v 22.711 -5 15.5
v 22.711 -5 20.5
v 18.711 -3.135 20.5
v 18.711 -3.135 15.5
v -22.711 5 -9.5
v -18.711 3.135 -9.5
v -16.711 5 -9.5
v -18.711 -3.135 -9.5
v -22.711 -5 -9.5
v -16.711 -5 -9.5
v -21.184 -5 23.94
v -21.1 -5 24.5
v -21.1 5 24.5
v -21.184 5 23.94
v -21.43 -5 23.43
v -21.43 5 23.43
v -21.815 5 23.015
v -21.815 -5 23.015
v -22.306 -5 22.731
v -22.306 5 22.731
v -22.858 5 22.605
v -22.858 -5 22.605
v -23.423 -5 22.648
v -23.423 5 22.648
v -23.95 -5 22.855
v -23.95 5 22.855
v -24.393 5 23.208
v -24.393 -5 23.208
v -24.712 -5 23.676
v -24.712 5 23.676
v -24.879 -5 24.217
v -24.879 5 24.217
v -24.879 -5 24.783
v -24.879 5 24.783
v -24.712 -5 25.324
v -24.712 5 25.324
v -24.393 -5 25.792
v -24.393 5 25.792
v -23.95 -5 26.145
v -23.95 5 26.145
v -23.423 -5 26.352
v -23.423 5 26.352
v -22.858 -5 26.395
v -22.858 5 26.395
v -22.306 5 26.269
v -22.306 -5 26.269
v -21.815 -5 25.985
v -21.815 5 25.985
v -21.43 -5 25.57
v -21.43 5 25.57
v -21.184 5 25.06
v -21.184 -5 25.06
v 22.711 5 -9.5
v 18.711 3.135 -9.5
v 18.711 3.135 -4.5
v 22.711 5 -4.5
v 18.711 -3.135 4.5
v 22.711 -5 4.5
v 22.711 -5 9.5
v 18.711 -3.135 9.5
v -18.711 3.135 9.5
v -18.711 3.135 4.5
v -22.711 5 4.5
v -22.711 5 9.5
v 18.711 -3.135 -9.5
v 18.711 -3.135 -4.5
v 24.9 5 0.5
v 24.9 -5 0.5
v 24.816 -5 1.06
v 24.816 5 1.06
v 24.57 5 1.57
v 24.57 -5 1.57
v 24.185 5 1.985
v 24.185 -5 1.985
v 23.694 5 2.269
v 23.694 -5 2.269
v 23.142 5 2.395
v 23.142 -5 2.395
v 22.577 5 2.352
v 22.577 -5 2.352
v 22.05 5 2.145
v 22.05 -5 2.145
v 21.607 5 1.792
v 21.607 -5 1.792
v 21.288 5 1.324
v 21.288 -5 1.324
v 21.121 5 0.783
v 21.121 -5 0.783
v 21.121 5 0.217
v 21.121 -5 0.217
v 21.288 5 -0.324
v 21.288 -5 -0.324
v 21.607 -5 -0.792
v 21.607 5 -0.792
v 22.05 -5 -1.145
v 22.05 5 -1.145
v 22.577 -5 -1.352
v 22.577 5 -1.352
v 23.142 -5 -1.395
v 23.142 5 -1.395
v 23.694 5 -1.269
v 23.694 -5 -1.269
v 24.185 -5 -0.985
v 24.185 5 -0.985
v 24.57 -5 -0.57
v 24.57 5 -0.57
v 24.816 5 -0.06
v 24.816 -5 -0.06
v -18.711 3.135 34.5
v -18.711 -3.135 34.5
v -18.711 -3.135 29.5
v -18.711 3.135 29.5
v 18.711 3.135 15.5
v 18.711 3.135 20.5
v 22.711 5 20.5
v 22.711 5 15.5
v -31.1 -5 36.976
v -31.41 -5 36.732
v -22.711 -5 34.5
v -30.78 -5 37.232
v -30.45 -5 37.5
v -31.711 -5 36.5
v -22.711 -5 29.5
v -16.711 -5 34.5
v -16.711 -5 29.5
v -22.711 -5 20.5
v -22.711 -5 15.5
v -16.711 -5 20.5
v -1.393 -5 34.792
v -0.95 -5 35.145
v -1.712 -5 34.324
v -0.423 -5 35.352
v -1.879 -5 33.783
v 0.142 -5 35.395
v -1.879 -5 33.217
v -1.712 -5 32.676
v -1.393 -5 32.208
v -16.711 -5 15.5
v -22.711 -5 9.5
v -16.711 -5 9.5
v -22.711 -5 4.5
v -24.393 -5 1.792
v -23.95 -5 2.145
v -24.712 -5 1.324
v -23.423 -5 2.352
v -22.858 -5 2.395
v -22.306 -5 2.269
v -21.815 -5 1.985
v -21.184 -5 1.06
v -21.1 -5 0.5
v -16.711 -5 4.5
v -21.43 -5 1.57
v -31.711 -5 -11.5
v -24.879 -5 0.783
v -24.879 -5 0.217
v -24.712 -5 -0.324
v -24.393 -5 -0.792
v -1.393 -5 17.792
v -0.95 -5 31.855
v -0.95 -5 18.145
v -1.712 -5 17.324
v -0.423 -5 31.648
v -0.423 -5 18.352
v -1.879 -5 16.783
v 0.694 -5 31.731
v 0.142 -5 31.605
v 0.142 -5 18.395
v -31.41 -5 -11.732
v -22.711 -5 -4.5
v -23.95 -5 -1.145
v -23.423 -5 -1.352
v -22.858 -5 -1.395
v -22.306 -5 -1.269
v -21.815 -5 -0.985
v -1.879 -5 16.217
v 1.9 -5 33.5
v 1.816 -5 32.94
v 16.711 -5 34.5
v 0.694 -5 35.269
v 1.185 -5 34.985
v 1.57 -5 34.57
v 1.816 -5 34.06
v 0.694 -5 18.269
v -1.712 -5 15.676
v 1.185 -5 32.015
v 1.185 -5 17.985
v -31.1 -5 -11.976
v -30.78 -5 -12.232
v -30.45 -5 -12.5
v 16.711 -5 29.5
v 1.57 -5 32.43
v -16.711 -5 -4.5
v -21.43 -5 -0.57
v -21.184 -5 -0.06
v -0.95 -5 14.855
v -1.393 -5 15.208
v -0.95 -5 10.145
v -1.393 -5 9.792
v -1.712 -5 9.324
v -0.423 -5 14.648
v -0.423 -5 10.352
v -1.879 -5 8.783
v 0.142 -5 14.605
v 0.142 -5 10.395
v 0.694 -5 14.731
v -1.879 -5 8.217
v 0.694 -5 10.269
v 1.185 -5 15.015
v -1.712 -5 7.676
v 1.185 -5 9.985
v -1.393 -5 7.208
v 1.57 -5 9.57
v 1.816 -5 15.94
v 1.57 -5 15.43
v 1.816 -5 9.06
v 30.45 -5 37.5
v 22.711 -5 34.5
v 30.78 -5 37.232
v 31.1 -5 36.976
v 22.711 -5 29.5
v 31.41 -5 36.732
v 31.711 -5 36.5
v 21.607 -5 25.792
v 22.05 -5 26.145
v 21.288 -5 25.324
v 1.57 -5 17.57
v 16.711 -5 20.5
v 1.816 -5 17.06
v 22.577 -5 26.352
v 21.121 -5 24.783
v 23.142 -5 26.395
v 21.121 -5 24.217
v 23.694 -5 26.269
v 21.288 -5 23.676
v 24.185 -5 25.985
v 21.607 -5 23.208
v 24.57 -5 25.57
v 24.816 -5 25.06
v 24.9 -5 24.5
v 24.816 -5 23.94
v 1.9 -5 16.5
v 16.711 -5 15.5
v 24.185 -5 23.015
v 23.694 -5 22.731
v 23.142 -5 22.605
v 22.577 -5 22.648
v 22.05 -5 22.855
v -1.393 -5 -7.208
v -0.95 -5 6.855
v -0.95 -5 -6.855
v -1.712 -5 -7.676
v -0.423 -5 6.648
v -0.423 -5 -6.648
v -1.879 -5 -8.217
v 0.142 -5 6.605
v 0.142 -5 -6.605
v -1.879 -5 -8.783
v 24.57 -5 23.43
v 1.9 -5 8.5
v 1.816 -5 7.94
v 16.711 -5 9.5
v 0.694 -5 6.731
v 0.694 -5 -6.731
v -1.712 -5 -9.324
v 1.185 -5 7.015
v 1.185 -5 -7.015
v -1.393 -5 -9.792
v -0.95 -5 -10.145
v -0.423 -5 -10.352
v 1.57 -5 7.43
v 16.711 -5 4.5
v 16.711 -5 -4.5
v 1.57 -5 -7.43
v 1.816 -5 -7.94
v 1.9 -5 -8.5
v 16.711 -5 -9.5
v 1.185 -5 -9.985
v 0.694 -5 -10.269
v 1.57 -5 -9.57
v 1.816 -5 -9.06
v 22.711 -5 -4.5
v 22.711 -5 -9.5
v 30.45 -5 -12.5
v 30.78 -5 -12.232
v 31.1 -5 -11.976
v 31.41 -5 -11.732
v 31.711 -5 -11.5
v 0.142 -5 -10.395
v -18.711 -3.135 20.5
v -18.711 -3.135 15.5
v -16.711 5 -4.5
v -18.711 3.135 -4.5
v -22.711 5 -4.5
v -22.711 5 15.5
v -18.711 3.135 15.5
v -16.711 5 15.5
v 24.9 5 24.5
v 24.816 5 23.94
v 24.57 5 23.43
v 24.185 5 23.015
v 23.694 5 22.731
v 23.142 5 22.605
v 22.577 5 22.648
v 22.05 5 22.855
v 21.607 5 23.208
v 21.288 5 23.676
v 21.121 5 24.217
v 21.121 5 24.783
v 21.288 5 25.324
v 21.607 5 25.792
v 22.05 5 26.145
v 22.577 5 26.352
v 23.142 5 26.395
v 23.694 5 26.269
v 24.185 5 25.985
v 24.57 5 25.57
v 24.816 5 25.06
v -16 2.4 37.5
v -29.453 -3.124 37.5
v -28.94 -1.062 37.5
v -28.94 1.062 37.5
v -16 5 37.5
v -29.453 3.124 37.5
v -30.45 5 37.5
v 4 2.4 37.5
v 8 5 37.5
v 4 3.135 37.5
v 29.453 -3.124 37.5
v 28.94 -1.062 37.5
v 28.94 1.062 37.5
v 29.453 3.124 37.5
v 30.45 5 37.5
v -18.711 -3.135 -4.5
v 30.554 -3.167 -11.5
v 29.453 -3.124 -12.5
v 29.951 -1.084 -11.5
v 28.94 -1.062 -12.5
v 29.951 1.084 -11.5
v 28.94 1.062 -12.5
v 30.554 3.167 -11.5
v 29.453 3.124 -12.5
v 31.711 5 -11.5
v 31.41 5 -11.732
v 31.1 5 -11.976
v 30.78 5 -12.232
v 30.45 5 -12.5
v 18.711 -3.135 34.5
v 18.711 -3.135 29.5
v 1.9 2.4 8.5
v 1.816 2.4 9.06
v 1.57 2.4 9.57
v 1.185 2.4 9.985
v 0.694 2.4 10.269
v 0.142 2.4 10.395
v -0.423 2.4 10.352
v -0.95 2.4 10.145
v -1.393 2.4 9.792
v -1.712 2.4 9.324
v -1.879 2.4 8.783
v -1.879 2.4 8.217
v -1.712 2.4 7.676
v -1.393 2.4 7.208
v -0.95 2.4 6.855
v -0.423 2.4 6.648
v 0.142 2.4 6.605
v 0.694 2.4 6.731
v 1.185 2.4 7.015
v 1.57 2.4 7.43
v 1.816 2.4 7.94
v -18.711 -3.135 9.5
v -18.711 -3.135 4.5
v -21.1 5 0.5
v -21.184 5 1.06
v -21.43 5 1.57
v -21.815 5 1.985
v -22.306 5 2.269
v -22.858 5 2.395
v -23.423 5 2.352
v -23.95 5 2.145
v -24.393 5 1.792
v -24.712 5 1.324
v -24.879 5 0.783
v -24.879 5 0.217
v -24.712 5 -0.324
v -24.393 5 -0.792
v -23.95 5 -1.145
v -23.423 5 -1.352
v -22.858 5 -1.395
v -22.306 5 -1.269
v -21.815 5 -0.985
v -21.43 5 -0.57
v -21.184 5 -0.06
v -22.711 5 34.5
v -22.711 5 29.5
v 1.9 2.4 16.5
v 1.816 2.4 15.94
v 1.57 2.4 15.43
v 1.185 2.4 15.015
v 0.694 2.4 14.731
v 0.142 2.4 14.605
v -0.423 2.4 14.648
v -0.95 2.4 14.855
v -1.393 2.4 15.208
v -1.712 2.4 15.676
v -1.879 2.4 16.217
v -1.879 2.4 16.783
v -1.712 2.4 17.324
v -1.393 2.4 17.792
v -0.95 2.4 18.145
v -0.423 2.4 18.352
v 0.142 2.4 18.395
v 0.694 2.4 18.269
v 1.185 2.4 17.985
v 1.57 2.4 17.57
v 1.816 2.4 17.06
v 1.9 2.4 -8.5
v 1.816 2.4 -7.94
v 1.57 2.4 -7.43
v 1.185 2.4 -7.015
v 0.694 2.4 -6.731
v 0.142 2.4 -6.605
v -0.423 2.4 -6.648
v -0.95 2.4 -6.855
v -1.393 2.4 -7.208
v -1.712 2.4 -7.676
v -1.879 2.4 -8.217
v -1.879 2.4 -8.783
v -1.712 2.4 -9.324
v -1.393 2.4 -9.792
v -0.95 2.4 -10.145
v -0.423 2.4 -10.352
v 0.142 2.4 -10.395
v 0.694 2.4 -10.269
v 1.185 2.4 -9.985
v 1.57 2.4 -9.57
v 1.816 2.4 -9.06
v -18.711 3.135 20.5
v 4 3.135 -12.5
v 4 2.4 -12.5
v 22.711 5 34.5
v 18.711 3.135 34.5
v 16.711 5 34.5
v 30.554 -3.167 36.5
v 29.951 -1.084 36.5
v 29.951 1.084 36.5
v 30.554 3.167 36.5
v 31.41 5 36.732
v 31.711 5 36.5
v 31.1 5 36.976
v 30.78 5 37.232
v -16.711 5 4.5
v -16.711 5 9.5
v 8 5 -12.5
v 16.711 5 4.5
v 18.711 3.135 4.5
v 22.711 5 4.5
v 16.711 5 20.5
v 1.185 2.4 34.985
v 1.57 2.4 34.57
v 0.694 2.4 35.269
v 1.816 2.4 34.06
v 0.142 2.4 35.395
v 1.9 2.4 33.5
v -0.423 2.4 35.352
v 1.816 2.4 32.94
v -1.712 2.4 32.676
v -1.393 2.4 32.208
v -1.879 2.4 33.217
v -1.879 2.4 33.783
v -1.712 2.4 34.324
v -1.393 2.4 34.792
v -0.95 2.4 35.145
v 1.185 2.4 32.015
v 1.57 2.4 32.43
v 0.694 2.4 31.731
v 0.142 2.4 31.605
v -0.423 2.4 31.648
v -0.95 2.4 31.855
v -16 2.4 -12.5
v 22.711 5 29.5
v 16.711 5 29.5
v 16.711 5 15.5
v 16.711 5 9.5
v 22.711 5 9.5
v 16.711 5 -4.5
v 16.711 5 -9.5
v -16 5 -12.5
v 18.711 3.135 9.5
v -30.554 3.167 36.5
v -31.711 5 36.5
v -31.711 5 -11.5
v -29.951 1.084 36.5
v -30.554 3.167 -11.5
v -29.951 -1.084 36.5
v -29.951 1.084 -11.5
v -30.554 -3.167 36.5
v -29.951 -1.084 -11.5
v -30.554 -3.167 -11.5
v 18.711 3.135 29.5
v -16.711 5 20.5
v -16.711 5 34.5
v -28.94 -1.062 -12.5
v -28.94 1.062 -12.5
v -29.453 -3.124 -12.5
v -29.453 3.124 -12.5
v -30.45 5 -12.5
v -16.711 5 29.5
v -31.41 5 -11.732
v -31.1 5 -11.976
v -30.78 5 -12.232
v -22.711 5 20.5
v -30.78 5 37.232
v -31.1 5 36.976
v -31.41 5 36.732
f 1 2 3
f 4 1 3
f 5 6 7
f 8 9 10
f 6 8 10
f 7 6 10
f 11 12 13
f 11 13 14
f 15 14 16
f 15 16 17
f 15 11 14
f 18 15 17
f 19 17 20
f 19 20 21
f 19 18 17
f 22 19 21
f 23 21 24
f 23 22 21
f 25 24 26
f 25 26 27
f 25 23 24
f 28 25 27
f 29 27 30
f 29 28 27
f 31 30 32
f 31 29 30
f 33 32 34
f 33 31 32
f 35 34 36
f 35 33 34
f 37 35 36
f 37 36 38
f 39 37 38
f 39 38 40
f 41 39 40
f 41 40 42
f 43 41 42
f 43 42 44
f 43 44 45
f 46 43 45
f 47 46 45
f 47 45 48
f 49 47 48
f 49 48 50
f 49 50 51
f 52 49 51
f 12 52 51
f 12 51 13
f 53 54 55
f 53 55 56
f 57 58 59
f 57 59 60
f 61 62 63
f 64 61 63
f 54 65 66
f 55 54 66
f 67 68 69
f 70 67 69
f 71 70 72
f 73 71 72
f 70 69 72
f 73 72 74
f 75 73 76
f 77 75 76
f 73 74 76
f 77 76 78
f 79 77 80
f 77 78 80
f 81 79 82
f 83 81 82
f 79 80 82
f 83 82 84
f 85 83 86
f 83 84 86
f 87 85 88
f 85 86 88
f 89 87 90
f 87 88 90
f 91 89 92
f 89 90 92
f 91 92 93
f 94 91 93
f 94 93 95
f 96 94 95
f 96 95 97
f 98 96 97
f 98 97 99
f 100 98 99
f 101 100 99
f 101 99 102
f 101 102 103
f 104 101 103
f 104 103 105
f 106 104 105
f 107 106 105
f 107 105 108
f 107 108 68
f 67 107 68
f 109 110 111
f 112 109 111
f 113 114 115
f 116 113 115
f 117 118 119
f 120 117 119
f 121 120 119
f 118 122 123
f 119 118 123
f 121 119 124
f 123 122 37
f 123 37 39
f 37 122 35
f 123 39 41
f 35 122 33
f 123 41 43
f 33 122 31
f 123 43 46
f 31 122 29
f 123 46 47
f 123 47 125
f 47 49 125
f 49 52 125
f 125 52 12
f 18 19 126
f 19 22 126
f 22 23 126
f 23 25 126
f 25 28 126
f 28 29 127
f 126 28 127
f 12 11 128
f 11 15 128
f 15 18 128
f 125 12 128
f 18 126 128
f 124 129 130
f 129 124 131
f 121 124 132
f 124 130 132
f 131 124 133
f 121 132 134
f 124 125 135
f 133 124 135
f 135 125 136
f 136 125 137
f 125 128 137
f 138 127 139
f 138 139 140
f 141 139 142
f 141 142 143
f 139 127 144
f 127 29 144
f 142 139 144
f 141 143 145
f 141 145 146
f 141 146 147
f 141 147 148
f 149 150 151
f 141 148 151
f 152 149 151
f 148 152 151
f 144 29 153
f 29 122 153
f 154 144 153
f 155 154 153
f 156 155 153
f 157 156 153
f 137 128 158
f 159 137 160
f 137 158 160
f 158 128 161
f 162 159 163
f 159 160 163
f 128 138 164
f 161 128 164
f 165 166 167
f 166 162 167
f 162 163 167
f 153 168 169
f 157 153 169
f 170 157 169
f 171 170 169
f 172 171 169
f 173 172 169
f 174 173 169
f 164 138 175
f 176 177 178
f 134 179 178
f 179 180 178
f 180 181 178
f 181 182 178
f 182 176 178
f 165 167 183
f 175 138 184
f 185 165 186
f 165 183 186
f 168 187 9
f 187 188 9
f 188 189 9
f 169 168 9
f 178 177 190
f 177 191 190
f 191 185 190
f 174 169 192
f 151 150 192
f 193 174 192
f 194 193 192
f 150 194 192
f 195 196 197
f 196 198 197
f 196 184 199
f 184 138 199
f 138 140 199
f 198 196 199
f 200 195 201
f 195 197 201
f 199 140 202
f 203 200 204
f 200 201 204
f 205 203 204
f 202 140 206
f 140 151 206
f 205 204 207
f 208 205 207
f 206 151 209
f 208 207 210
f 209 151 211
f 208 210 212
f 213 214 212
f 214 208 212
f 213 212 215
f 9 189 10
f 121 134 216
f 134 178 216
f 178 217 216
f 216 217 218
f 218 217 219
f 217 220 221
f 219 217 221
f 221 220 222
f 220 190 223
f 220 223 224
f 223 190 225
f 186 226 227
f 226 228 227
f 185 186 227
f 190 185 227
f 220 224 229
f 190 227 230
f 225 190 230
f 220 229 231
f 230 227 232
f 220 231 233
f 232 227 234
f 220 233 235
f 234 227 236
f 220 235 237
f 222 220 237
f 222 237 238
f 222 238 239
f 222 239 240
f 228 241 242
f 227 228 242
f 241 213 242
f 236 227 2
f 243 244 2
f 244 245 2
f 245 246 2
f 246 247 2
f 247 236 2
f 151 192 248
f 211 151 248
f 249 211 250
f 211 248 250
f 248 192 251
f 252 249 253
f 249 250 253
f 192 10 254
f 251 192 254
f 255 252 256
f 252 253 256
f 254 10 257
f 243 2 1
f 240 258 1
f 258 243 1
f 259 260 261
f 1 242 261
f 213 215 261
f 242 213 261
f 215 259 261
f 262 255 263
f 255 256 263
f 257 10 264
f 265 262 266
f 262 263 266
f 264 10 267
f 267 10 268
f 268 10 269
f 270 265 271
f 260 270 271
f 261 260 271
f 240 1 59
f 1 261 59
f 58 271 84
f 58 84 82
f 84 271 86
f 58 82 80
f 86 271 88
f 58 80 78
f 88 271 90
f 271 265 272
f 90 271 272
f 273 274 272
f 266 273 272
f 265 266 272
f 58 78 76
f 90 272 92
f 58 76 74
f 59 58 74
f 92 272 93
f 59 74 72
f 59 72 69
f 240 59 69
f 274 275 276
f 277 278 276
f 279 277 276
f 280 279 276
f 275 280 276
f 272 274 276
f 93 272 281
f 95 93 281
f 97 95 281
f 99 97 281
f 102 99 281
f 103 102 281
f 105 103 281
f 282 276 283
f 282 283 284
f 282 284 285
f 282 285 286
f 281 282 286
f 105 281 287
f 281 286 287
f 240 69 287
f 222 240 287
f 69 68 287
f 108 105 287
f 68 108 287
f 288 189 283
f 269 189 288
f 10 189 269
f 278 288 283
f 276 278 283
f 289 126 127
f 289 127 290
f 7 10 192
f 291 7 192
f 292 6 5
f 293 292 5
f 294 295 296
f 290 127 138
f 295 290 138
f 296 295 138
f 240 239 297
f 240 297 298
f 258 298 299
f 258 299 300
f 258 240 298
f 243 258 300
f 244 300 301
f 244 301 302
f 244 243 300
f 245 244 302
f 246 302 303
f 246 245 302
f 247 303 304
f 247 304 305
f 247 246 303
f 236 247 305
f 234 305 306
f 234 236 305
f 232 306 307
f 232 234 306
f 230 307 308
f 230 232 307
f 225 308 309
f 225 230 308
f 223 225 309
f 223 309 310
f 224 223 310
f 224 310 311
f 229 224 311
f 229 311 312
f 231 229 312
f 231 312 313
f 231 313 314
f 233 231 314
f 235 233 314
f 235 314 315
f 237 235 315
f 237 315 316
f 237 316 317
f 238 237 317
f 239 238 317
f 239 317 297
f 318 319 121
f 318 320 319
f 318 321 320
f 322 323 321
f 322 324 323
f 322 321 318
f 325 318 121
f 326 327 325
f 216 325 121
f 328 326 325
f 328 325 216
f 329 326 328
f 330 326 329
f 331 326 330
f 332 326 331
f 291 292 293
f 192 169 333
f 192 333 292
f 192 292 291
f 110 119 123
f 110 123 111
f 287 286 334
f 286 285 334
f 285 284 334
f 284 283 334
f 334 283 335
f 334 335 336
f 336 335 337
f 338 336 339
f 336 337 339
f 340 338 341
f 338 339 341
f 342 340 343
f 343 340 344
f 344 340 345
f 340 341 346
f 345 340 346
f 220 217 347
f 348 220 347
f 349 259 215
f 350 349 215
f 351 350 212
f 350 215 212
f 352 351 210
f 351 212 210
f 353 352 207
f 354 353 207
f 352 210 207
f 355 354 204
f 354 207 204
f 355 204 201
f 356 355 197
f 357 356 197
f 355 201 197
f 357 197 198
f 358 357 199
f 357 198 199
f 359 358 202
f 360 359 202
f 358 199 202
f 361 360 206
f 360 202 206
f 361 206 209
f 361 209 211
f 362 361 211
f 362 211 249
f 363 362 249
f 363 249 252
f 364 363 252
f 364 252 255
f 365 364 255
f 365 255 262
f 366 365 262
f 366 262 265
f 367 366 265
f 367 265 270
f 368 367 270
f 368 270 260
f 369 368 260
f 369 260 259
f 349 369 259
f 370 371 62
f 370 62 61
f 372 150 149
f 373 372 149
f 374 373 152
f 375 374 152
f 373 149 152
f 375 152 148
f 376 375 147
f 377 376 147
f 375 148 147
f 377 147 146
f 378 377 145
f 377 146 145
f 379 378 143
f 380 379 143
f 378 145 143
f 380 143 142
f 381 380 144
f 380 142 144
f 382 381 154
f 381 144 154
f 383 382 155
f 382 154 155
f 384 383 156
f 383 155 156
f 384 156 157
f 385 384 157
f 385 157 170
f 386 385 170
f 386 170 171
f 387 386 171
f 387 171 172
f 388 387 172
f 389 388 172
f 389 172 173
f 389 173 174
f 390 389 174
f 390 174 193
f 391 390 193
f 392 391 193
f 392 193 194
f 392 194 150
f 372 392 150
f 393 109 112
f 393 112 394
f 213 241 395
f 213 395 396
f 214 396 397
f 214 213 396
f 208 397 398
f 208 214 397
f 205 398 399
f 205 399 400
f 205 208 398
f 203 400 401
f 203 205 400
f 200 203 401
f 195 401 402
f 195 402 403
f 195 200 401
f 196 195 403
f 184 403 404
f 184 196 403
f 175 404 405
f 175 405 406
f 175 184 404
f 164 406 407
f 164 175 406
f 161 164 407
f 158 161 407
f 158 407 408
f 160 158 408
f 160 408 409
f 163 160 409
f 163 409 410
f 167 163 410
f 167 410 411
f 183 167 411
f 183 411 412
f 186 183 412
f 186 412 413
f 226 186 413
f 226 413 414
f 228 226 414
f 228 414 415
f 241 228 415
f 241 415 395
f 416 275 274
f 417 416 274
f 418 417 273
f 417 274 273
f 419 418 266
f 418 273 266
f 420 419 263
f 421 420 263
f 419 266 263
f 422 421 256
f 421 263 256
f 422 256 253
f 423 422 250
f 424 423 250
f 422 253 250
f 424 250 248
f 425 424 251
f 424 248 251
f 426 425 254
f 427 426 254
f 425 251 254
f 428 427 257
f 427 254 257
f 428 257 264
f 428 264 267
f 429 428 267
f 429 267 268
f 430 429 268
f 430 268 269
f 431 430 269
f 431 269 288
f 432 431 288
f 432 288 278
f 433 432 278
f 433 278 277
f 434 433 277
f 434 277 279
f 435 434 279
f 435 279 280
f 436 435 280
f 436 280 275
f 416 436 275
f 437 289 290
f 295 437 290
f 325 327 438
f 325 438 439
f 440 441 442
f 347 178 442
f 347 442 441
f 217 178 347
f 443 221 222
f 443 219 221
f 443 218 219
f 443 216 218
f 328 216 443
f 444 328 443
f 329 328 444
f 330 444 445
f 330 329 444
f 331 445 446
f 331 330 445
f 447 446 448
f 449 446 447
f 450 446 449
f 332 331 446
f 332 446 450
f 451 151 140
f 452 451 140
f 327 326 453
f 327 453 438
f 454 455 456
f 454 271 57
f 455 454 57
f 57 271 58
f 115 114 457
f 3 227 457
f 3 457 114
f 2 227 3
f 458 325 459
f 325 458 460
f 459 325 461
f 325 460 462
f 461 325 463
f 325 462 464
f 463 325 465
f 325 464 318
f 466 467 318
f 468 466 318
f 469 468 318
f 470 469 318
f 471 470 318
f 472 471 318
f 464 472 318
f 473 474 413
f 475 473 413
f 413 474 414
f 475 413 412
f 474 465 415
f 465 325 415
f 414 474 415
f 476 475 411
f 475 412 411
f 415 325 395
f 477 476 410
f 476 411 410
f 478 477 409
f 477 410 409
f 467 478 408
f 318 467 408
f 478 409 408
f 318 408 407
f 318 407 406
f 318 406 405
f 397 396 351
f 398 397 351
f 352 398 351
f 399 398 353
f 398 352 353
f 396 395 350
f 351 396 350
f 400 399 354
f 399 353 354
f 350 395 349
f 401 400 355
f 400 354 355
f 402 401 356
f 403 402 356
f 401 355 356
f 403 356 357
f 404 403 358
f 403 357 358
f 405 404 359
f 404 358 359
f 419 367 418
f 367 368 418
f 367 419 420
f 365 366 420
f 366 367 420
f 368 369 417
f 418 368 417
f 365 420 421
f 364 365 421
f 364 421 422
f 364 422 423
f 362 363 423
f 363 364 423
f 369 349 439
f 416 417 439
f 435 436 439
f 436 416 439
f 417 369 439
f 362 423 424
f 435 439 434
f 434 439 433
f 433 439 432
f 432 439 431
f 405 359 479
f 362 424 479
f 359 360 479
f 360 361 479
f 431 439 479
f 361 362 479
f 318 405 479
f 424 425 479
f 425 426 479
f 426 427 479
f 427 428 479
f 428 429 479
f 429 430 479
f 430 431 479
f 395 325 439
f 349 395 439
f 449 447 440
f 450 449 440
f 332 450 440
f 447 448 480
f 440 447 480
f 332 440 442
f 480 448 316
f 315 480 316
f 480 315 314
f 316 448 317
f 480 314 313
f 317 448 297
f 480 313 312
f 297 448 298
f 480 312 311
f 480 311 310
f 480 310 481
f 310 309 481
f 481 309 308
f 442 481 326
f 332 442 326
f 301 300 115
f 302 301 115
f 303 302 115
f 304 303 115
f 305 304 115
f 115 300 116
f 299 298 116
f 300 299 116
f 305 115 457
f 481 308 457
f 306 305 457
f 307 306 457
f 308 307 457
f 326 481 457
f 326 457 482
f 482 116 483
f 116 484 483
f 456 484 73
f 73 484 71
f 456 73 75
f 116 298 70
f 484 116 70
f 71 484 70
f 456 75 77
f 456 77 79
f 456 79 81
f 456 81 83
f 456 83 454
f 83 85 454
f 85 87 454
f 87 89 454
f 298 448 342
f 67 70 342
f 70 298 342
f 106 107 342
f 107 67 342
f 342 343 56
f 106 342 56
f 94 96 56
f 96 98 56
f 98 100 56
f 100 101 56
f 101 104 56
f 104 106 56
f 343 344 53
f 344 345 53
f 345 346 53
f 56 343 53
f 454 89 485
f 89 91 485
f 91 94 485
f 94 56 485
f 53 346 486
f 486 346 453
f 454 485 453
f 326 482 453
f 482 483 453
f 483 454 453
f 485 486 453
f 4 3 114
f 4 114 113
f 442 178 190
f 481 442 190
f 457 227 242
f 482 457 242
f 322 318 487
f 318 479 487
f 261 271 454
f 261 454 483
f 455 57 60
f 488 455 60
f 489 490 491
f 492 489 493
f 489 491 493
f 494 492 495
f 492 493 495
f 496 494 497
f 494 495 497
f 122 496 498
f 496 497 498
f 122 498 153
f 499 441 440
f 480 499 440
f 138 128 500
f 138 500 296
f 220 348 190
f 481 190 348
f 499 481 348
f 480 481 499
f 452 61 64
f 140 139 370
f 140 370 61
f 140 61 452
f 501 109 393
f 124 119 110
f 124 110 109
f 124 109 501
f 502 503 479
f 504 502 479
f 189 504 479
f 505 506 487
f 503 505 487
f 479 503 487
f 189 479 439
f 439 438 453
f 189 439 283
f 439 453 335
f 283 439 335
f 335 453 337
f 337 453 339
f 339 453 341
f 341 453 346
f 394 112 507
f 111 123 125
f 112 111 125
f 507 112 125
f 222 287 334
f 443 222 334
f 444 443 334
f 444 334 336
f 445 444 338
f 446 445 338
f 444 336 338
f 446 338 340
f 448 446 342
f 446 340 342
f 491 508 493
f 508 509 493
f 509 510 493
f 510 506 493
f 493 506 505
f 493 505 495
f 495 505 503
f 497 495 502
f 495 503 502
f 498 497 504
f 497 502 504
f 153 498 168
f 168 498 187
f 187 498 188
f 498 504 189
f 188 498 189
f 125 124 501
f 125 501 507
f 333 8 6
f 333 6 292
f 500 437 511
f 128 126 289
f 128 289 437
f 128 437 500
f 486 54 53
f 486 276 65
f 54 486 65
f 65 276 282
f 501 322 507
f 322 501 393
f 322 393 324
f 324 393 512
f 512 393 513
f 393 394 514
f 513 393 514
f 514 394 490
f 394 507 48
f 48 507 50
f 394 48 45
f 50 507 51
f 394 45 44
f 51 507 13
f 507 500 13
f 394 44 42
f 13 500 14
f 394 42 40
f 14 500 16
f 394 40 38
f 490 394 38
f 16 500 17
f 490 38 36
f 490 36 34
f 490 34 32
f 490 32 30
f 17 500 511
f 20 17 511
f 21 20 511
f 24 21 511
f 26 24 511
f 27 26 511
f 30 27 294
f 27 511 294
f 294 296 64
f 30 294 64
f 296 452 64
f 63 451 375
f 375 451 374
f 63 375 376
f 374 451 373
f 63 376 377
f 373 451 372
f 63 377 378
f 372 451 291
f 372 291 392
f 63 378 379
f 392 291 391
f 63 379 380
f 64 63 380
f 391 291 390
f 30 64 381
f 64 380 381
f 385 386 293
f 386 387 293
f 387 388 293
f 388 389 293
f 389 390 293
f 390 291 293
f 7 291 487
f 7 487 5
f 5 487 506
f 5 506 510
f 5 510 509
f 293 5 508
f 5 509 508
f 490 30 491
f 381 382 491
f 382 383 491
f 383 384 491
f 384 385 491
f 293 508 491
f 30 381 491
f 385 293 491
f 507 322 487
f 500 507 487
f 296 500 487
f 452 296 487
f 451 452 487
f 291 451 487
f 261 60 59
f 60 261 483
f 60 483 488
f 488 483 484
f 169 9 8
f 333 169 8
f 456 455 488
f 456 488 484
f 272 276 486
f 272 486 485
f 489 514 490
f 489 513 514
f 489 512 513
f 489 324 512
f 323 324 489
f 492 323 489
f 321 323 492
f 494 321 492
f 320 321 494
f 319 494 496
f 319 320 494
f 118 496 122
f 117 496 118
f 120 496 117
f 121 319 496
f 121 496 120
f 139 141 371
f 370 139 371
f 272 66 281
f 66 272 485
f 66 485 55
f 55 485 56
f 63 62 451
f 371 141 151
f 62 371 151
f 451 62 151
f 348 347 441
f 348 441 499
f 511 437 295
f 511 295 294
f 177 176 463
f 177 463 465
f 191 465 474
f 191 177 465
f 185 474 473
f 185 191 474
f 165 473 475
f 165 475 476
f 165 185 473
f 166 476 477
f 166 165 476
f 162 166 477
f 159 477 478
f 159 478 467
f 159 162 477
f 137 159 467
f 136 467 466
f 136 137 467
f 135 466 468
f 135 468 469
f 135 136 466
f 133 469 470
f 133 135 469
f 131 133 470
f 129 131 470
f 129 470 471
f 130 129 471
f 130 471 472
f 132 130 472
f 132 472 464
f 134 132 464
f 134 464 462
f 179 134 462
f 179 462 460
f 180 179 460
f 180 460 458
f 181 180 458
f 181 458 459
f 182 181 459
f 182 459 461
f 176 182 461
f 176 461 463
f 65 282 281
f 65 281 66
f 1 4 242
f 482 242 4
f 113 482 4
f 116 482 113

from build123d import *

# Parameters (mm, degrees)
F1_DEPTH     = 12.5
F2_R         = 1.9
F2_W         = 2
F2_H         = 5
F3_DEPTH     = 25
F5_T1_DEPTH  = 5
F5_T3_DEPTH  = 5
F5_T5_DEPTH  = 22.8639018857
F5_T7_DEPTH  = 22.8639018857
F5_T12_DEPTH = 25.7278037714
F5_T17_DEPTH = 25.7278037714
F5_T22_DEPTH = 25.7278037714
F5_T27_DEPTH = 25.7278037714
F5_T32_DEPTH = 25.7278037714
F5_T37_DEPTH = 25.7278037714
F5_T42_DEPTH = 25.7278037714
F5_T47_DEPTH = 25.7278037714
F10_SIZE     = 1


# Not quite as in the source:
# - a fillet or chamfer that OpenCascade refuses, or shapes differently, is made with other operations: its cross-section is extruded or revolved along the edge and cut away or added
# - two fillets or chamfers of one size are made in one step


with BuildPart() as f1:
    # F0 (on Top) → F1 (new body, symmetric)
    with BuildSketch(Plane.XY):
        with BuildLine():
            ThreePointArc((-31.711398723, 5), (-30.3486184122, 2.6632855775), (-29.875, 0))
            ThreePointArc((-29.875, 0), (-30.3486184122, -2.6632855775), (-31.711398723, -5))
            Line((-31.711398723, -5), (31.711398723, -5))
            ThreePointArc((31.711398723, -5), (29.875, 0), (31.711398723, 5))
            Line((31.711398723, 5), (4, 5))
            Line((4, 5), (4, 2.4))
            Line((4, 2.4), (-16, 2.4))
            Line((-16, 2.4), (-16, 5))
            Line((-16, 5), (-31.711398723, 5))
        make_face()
    extrude(amount=F1_DEPTH, both=True)

    # F2 (on face) → F3 (cut)
    with BuildSketch(Plane.XZ.offset(5)):
        with Locations((0, 8.5)):
            Circle(F2_R)
        with Locations((0, -8.5)):
            Circle(F2_R)
        with Locations((-17.711398723, 7)):
            Rectangle(F2_W, F2_H)
        with Locations((-17.711398723, -7)):
            Rectangle(F2_W, F2_H)
        with Locations((17.711398723, 7)):
            Rectangle(F2_W, F2_H)
        with Locations((17.711398723, -7)):
            Rectangle(F2_W, F2_H)
        with Locations((-23, 0.5)):
            Circle(F2_R)
        with Locations((23, 0.5)):
            Circle(F2_R)
    extrude(amount=-F3_DEPTH, mode=Mode.SUBTRACT)

    # F5: chamfer of 4 x 1.8652306326 on 10 edges, made by hand

    # F5_s2 → F5_t1 (cut)
    with BuildSketch(Plane.XY.offset(-9.5)):
        Polygon((22.711398723, -5), (18.711398723, -3.1347693674), (18.711398723, -5), align=None)
        Polygon((-22.711398723, -5), (-18.711398723, -3.1347693674), (-18.711398723, -5), align=None)
        Polygon((-18.711398723, 3.1347693674), (-22.711398723, 5), (-18.711398723, 5), align=None)
        Polygon((18.711398723, 3.1347693674), (22.711398723, 5), (18.711398723, 5), align=None)
    extrude(amount=F5_T1_DEPTH, mode=Mode.SUBTRACT)

    # F5_s4 → F5_t3 (cut)
    with BuildSketch(Plane.XY.offset(4.5)):
        Polygon((22.711398723, -5), (18.711398723, -3.1347693674), (18.711398723, -5), align=None)
        Polygon((-22.711398723, -5), (-18.711398723, -3.1347693674), (-18.711398723, -5), align=None)
        Polygon((-18.711398723, 3.1347693674), (-22.711398723, 5), (-18.711398723, 5), align=None)
        Polygon((18.711398723, 3.1347693674), (22.711398723, 5), (18.711398723, 5), align=None)
    extrude(amount=F5_T3_DEPTH, mode=Mode.SUBTRACT)

    # F5_s6 → F5_t5 (cut)
    with BuildSketch(Plane.XY.offset(-22.8639018857)):
        Polygon((8, 5), (4, 3.1347693674), (4, 5), align=None)
    extrude(amount=F5_T5_DEPTH, mode=Mode.SUBTRACT)

    # F5_s8 → F5_t7 (cut)
    with BuildSketch(Plane.XY):
        Polygon((8, 5), (4, 3.1347693674), (4, 5), align=None)
    extrude(amount=F5_T7_DEPTH, mode=Mode.SUBTRACT)


with BuildPart() as f5_tool10:
    # F5_s11 → F5_t12 (new body)
    with BuildSketch(Plane.XY.offset(-19.8639018857)):
        Polygon((22.711398723, -5), (18.711398723, -3.1347693674), (18.711398723, -5), align=None)
    extrude(amount=F5_T12_DEPTH)

    split(bisect_by=Plane.XY.offset(4.5), keep=Keep.TOP)


with BuildPart() as f1_1:
    add(f1.part)

    # F5_t9: cut F5_tool10
    add(f5_tool10.part, mode=Mode.SUBTRACT)


with BuildPart() as f5_tool15:
    # F5_s16 → F5_t17 (new body)
    with BuildSketch(Plane.XY.offset(-5.8639018857)):
        Polygon((22.711398723, -5), (18.711398723, -3.1347693674), (18.711398723, -5), align=None)
    extrude(amount=F5_T17_DEPTH)

    split(bisect_by=Plane.XY.offset(-4.5), keep=Keep.BOTTOM)


with BuildPart() as f1_2:
    add(f1_1.part)

    # F5_t14: cut F5_tool15
    add(f5_tool15.part, mode=Mode.SUBTRACT)


with BuildPart() as f5_tool20:
    # F5_s21 → F5_t22 (new body)
    with BuildSketch(Plane.XY.offset(5.8639018857)):
        Polygon((-22.711398723, -5), (-18.711398723, -3.1347693674), (-18.711398723, -5), align=None)
    extrude(amount=-F5_T22_DEPTH)

    split(bisect_by=Plane.XY.offset(4.5), keep=Keep.TOP)


with BuildPart() as f1_3:
    add(f1_2.part)

    # F5_t19: cut F5_tool20
    add(f5_tool20.part, mode=Mode.SUBTRACT)


with BuildPart() as f5_tool25:
    # F5_s26 → F5_t27 (new body)
    with BuildSketch(Plane.XY.offset(19.8639018857)):
        Polygon((-22.711398723, -5), (-18.711398723, -3.1347693674), (-18.711398723, -5), align=None)
    extrude(amount=-F5_T27_DEPTH)

    split(bisect_by=Plane.XY.offset(-4.5), keep=Keep.BOTTOM)


with BuildPart() as f1_4:
    add(f1_3.part)

    # F5_t24: cut F5_tool25
    add(f5_tool25.part, mode=Mode.SUBTRACT)


with BuildPart() as f5_tool30:
    # F5_s31 → F5_t32 (new body)
    with BuildSketch(Plane.XY.offset(-19.8639018857)):
        Polygon((-18.711398723, 3.1347693674), (-22.711398723, 5), (-18.711398723, 5), align=None)
    extrude(amount=F5_T32_DEPTH)

    split(bisect_by=Plane.XY.offset(4.5), keep=Keep.TOP)


with BuildPart() as f1_5:
    add(f1_4.part)

    # F5_t29: cut F5_tool30
    add(f5_tool30.part, mode=Mode.SUBTRACT)


with BuildPart() as f5_tool35:
    # F5_s36 → F5_t37 (new body)
    with BuildSketch(Plane.XY.offset(5.8639018857)):
        Polygon((18.711398723, 3.1347693674), (22.711398723, 5), (18.711398723, 5), align=None)
    extrude(amount=-F5_T37_DEPTH)

    split(bisect_by=Plane.XY.offset(4.5), keep=Keep.TOP)


with BuildPart() as f1_6:
    add(f1_5.part)

    # F5_t34: cut F5_tool35
    add(f5_tool35.part, mode=Mode.SUBTRACT)


with BuildPart() as f5_tool40:
    # F5_s41 → F5_t42 (new body)
    with BuildSketch(Plane.XY.offset(19.8639018857)):
        Polygon((-18.711398723, 3.1347693674), (-22.711398723, 5), (-18.711398723, 5), align=None)
    extrude(amount=-F5_T42_DEPTH)

    split(bisect_by=Plane.XY.offset(-4.5), keep=Keep.BOTTOM)


with BuildPart() as f1_7:
    add(f1_6.part)

    # F5_t39: cut F5_tool40
    add(f5_tool40.part, mode=Mode.SUBTRACT)


with BuildPart() as f5_tool45:
    # F5_s46 → F5_t47 (new body)
    with BuildSketch(Plane.XY.offset(-5.8639018857)):
        Polygon((18.711398723, 3.1347693674), (22.711398723, 5), (18.711398723, 5), align=None)
    extrude(amount=F5_T47_DEPTH)

    split(bisect_by=Plane.XY.offset(-4.5), keep=Keep.BOTTOM)


with BuildPart() as f1_8:
    add(f1_7.part)

    # F5_t44: cut F5_tool45
    add(f5_tool45.part, mode=Mode.SUBTRACT)

    # F9: F1 across face


with BuildPart() as f1_9:
    add(f1_8.part)
    add(f1_8.part.mirror(Plane(origin=(0.5278701032, -0.3772073921, 12.5), x_dir=(1, 0, 0), z_dir=(0, 0, 1))))

    # F10
    f10_edges = [f1_9.edges().sort_by_distance(p)[0] for p in [
        (29.875, 0, 37.5),
        (29.875, 0, -12.5),
        (-30.348618, 2.663286, 37.5),
        (-30.348618, -2.663286, 37.5),
        (-30.348618, -2.663286, -12.5),
        (-30.348618, 2.663286, -12.5),
    ]]
    chamfer(f10_edges, length=F10_SIZE)


solid = f1_9.part
